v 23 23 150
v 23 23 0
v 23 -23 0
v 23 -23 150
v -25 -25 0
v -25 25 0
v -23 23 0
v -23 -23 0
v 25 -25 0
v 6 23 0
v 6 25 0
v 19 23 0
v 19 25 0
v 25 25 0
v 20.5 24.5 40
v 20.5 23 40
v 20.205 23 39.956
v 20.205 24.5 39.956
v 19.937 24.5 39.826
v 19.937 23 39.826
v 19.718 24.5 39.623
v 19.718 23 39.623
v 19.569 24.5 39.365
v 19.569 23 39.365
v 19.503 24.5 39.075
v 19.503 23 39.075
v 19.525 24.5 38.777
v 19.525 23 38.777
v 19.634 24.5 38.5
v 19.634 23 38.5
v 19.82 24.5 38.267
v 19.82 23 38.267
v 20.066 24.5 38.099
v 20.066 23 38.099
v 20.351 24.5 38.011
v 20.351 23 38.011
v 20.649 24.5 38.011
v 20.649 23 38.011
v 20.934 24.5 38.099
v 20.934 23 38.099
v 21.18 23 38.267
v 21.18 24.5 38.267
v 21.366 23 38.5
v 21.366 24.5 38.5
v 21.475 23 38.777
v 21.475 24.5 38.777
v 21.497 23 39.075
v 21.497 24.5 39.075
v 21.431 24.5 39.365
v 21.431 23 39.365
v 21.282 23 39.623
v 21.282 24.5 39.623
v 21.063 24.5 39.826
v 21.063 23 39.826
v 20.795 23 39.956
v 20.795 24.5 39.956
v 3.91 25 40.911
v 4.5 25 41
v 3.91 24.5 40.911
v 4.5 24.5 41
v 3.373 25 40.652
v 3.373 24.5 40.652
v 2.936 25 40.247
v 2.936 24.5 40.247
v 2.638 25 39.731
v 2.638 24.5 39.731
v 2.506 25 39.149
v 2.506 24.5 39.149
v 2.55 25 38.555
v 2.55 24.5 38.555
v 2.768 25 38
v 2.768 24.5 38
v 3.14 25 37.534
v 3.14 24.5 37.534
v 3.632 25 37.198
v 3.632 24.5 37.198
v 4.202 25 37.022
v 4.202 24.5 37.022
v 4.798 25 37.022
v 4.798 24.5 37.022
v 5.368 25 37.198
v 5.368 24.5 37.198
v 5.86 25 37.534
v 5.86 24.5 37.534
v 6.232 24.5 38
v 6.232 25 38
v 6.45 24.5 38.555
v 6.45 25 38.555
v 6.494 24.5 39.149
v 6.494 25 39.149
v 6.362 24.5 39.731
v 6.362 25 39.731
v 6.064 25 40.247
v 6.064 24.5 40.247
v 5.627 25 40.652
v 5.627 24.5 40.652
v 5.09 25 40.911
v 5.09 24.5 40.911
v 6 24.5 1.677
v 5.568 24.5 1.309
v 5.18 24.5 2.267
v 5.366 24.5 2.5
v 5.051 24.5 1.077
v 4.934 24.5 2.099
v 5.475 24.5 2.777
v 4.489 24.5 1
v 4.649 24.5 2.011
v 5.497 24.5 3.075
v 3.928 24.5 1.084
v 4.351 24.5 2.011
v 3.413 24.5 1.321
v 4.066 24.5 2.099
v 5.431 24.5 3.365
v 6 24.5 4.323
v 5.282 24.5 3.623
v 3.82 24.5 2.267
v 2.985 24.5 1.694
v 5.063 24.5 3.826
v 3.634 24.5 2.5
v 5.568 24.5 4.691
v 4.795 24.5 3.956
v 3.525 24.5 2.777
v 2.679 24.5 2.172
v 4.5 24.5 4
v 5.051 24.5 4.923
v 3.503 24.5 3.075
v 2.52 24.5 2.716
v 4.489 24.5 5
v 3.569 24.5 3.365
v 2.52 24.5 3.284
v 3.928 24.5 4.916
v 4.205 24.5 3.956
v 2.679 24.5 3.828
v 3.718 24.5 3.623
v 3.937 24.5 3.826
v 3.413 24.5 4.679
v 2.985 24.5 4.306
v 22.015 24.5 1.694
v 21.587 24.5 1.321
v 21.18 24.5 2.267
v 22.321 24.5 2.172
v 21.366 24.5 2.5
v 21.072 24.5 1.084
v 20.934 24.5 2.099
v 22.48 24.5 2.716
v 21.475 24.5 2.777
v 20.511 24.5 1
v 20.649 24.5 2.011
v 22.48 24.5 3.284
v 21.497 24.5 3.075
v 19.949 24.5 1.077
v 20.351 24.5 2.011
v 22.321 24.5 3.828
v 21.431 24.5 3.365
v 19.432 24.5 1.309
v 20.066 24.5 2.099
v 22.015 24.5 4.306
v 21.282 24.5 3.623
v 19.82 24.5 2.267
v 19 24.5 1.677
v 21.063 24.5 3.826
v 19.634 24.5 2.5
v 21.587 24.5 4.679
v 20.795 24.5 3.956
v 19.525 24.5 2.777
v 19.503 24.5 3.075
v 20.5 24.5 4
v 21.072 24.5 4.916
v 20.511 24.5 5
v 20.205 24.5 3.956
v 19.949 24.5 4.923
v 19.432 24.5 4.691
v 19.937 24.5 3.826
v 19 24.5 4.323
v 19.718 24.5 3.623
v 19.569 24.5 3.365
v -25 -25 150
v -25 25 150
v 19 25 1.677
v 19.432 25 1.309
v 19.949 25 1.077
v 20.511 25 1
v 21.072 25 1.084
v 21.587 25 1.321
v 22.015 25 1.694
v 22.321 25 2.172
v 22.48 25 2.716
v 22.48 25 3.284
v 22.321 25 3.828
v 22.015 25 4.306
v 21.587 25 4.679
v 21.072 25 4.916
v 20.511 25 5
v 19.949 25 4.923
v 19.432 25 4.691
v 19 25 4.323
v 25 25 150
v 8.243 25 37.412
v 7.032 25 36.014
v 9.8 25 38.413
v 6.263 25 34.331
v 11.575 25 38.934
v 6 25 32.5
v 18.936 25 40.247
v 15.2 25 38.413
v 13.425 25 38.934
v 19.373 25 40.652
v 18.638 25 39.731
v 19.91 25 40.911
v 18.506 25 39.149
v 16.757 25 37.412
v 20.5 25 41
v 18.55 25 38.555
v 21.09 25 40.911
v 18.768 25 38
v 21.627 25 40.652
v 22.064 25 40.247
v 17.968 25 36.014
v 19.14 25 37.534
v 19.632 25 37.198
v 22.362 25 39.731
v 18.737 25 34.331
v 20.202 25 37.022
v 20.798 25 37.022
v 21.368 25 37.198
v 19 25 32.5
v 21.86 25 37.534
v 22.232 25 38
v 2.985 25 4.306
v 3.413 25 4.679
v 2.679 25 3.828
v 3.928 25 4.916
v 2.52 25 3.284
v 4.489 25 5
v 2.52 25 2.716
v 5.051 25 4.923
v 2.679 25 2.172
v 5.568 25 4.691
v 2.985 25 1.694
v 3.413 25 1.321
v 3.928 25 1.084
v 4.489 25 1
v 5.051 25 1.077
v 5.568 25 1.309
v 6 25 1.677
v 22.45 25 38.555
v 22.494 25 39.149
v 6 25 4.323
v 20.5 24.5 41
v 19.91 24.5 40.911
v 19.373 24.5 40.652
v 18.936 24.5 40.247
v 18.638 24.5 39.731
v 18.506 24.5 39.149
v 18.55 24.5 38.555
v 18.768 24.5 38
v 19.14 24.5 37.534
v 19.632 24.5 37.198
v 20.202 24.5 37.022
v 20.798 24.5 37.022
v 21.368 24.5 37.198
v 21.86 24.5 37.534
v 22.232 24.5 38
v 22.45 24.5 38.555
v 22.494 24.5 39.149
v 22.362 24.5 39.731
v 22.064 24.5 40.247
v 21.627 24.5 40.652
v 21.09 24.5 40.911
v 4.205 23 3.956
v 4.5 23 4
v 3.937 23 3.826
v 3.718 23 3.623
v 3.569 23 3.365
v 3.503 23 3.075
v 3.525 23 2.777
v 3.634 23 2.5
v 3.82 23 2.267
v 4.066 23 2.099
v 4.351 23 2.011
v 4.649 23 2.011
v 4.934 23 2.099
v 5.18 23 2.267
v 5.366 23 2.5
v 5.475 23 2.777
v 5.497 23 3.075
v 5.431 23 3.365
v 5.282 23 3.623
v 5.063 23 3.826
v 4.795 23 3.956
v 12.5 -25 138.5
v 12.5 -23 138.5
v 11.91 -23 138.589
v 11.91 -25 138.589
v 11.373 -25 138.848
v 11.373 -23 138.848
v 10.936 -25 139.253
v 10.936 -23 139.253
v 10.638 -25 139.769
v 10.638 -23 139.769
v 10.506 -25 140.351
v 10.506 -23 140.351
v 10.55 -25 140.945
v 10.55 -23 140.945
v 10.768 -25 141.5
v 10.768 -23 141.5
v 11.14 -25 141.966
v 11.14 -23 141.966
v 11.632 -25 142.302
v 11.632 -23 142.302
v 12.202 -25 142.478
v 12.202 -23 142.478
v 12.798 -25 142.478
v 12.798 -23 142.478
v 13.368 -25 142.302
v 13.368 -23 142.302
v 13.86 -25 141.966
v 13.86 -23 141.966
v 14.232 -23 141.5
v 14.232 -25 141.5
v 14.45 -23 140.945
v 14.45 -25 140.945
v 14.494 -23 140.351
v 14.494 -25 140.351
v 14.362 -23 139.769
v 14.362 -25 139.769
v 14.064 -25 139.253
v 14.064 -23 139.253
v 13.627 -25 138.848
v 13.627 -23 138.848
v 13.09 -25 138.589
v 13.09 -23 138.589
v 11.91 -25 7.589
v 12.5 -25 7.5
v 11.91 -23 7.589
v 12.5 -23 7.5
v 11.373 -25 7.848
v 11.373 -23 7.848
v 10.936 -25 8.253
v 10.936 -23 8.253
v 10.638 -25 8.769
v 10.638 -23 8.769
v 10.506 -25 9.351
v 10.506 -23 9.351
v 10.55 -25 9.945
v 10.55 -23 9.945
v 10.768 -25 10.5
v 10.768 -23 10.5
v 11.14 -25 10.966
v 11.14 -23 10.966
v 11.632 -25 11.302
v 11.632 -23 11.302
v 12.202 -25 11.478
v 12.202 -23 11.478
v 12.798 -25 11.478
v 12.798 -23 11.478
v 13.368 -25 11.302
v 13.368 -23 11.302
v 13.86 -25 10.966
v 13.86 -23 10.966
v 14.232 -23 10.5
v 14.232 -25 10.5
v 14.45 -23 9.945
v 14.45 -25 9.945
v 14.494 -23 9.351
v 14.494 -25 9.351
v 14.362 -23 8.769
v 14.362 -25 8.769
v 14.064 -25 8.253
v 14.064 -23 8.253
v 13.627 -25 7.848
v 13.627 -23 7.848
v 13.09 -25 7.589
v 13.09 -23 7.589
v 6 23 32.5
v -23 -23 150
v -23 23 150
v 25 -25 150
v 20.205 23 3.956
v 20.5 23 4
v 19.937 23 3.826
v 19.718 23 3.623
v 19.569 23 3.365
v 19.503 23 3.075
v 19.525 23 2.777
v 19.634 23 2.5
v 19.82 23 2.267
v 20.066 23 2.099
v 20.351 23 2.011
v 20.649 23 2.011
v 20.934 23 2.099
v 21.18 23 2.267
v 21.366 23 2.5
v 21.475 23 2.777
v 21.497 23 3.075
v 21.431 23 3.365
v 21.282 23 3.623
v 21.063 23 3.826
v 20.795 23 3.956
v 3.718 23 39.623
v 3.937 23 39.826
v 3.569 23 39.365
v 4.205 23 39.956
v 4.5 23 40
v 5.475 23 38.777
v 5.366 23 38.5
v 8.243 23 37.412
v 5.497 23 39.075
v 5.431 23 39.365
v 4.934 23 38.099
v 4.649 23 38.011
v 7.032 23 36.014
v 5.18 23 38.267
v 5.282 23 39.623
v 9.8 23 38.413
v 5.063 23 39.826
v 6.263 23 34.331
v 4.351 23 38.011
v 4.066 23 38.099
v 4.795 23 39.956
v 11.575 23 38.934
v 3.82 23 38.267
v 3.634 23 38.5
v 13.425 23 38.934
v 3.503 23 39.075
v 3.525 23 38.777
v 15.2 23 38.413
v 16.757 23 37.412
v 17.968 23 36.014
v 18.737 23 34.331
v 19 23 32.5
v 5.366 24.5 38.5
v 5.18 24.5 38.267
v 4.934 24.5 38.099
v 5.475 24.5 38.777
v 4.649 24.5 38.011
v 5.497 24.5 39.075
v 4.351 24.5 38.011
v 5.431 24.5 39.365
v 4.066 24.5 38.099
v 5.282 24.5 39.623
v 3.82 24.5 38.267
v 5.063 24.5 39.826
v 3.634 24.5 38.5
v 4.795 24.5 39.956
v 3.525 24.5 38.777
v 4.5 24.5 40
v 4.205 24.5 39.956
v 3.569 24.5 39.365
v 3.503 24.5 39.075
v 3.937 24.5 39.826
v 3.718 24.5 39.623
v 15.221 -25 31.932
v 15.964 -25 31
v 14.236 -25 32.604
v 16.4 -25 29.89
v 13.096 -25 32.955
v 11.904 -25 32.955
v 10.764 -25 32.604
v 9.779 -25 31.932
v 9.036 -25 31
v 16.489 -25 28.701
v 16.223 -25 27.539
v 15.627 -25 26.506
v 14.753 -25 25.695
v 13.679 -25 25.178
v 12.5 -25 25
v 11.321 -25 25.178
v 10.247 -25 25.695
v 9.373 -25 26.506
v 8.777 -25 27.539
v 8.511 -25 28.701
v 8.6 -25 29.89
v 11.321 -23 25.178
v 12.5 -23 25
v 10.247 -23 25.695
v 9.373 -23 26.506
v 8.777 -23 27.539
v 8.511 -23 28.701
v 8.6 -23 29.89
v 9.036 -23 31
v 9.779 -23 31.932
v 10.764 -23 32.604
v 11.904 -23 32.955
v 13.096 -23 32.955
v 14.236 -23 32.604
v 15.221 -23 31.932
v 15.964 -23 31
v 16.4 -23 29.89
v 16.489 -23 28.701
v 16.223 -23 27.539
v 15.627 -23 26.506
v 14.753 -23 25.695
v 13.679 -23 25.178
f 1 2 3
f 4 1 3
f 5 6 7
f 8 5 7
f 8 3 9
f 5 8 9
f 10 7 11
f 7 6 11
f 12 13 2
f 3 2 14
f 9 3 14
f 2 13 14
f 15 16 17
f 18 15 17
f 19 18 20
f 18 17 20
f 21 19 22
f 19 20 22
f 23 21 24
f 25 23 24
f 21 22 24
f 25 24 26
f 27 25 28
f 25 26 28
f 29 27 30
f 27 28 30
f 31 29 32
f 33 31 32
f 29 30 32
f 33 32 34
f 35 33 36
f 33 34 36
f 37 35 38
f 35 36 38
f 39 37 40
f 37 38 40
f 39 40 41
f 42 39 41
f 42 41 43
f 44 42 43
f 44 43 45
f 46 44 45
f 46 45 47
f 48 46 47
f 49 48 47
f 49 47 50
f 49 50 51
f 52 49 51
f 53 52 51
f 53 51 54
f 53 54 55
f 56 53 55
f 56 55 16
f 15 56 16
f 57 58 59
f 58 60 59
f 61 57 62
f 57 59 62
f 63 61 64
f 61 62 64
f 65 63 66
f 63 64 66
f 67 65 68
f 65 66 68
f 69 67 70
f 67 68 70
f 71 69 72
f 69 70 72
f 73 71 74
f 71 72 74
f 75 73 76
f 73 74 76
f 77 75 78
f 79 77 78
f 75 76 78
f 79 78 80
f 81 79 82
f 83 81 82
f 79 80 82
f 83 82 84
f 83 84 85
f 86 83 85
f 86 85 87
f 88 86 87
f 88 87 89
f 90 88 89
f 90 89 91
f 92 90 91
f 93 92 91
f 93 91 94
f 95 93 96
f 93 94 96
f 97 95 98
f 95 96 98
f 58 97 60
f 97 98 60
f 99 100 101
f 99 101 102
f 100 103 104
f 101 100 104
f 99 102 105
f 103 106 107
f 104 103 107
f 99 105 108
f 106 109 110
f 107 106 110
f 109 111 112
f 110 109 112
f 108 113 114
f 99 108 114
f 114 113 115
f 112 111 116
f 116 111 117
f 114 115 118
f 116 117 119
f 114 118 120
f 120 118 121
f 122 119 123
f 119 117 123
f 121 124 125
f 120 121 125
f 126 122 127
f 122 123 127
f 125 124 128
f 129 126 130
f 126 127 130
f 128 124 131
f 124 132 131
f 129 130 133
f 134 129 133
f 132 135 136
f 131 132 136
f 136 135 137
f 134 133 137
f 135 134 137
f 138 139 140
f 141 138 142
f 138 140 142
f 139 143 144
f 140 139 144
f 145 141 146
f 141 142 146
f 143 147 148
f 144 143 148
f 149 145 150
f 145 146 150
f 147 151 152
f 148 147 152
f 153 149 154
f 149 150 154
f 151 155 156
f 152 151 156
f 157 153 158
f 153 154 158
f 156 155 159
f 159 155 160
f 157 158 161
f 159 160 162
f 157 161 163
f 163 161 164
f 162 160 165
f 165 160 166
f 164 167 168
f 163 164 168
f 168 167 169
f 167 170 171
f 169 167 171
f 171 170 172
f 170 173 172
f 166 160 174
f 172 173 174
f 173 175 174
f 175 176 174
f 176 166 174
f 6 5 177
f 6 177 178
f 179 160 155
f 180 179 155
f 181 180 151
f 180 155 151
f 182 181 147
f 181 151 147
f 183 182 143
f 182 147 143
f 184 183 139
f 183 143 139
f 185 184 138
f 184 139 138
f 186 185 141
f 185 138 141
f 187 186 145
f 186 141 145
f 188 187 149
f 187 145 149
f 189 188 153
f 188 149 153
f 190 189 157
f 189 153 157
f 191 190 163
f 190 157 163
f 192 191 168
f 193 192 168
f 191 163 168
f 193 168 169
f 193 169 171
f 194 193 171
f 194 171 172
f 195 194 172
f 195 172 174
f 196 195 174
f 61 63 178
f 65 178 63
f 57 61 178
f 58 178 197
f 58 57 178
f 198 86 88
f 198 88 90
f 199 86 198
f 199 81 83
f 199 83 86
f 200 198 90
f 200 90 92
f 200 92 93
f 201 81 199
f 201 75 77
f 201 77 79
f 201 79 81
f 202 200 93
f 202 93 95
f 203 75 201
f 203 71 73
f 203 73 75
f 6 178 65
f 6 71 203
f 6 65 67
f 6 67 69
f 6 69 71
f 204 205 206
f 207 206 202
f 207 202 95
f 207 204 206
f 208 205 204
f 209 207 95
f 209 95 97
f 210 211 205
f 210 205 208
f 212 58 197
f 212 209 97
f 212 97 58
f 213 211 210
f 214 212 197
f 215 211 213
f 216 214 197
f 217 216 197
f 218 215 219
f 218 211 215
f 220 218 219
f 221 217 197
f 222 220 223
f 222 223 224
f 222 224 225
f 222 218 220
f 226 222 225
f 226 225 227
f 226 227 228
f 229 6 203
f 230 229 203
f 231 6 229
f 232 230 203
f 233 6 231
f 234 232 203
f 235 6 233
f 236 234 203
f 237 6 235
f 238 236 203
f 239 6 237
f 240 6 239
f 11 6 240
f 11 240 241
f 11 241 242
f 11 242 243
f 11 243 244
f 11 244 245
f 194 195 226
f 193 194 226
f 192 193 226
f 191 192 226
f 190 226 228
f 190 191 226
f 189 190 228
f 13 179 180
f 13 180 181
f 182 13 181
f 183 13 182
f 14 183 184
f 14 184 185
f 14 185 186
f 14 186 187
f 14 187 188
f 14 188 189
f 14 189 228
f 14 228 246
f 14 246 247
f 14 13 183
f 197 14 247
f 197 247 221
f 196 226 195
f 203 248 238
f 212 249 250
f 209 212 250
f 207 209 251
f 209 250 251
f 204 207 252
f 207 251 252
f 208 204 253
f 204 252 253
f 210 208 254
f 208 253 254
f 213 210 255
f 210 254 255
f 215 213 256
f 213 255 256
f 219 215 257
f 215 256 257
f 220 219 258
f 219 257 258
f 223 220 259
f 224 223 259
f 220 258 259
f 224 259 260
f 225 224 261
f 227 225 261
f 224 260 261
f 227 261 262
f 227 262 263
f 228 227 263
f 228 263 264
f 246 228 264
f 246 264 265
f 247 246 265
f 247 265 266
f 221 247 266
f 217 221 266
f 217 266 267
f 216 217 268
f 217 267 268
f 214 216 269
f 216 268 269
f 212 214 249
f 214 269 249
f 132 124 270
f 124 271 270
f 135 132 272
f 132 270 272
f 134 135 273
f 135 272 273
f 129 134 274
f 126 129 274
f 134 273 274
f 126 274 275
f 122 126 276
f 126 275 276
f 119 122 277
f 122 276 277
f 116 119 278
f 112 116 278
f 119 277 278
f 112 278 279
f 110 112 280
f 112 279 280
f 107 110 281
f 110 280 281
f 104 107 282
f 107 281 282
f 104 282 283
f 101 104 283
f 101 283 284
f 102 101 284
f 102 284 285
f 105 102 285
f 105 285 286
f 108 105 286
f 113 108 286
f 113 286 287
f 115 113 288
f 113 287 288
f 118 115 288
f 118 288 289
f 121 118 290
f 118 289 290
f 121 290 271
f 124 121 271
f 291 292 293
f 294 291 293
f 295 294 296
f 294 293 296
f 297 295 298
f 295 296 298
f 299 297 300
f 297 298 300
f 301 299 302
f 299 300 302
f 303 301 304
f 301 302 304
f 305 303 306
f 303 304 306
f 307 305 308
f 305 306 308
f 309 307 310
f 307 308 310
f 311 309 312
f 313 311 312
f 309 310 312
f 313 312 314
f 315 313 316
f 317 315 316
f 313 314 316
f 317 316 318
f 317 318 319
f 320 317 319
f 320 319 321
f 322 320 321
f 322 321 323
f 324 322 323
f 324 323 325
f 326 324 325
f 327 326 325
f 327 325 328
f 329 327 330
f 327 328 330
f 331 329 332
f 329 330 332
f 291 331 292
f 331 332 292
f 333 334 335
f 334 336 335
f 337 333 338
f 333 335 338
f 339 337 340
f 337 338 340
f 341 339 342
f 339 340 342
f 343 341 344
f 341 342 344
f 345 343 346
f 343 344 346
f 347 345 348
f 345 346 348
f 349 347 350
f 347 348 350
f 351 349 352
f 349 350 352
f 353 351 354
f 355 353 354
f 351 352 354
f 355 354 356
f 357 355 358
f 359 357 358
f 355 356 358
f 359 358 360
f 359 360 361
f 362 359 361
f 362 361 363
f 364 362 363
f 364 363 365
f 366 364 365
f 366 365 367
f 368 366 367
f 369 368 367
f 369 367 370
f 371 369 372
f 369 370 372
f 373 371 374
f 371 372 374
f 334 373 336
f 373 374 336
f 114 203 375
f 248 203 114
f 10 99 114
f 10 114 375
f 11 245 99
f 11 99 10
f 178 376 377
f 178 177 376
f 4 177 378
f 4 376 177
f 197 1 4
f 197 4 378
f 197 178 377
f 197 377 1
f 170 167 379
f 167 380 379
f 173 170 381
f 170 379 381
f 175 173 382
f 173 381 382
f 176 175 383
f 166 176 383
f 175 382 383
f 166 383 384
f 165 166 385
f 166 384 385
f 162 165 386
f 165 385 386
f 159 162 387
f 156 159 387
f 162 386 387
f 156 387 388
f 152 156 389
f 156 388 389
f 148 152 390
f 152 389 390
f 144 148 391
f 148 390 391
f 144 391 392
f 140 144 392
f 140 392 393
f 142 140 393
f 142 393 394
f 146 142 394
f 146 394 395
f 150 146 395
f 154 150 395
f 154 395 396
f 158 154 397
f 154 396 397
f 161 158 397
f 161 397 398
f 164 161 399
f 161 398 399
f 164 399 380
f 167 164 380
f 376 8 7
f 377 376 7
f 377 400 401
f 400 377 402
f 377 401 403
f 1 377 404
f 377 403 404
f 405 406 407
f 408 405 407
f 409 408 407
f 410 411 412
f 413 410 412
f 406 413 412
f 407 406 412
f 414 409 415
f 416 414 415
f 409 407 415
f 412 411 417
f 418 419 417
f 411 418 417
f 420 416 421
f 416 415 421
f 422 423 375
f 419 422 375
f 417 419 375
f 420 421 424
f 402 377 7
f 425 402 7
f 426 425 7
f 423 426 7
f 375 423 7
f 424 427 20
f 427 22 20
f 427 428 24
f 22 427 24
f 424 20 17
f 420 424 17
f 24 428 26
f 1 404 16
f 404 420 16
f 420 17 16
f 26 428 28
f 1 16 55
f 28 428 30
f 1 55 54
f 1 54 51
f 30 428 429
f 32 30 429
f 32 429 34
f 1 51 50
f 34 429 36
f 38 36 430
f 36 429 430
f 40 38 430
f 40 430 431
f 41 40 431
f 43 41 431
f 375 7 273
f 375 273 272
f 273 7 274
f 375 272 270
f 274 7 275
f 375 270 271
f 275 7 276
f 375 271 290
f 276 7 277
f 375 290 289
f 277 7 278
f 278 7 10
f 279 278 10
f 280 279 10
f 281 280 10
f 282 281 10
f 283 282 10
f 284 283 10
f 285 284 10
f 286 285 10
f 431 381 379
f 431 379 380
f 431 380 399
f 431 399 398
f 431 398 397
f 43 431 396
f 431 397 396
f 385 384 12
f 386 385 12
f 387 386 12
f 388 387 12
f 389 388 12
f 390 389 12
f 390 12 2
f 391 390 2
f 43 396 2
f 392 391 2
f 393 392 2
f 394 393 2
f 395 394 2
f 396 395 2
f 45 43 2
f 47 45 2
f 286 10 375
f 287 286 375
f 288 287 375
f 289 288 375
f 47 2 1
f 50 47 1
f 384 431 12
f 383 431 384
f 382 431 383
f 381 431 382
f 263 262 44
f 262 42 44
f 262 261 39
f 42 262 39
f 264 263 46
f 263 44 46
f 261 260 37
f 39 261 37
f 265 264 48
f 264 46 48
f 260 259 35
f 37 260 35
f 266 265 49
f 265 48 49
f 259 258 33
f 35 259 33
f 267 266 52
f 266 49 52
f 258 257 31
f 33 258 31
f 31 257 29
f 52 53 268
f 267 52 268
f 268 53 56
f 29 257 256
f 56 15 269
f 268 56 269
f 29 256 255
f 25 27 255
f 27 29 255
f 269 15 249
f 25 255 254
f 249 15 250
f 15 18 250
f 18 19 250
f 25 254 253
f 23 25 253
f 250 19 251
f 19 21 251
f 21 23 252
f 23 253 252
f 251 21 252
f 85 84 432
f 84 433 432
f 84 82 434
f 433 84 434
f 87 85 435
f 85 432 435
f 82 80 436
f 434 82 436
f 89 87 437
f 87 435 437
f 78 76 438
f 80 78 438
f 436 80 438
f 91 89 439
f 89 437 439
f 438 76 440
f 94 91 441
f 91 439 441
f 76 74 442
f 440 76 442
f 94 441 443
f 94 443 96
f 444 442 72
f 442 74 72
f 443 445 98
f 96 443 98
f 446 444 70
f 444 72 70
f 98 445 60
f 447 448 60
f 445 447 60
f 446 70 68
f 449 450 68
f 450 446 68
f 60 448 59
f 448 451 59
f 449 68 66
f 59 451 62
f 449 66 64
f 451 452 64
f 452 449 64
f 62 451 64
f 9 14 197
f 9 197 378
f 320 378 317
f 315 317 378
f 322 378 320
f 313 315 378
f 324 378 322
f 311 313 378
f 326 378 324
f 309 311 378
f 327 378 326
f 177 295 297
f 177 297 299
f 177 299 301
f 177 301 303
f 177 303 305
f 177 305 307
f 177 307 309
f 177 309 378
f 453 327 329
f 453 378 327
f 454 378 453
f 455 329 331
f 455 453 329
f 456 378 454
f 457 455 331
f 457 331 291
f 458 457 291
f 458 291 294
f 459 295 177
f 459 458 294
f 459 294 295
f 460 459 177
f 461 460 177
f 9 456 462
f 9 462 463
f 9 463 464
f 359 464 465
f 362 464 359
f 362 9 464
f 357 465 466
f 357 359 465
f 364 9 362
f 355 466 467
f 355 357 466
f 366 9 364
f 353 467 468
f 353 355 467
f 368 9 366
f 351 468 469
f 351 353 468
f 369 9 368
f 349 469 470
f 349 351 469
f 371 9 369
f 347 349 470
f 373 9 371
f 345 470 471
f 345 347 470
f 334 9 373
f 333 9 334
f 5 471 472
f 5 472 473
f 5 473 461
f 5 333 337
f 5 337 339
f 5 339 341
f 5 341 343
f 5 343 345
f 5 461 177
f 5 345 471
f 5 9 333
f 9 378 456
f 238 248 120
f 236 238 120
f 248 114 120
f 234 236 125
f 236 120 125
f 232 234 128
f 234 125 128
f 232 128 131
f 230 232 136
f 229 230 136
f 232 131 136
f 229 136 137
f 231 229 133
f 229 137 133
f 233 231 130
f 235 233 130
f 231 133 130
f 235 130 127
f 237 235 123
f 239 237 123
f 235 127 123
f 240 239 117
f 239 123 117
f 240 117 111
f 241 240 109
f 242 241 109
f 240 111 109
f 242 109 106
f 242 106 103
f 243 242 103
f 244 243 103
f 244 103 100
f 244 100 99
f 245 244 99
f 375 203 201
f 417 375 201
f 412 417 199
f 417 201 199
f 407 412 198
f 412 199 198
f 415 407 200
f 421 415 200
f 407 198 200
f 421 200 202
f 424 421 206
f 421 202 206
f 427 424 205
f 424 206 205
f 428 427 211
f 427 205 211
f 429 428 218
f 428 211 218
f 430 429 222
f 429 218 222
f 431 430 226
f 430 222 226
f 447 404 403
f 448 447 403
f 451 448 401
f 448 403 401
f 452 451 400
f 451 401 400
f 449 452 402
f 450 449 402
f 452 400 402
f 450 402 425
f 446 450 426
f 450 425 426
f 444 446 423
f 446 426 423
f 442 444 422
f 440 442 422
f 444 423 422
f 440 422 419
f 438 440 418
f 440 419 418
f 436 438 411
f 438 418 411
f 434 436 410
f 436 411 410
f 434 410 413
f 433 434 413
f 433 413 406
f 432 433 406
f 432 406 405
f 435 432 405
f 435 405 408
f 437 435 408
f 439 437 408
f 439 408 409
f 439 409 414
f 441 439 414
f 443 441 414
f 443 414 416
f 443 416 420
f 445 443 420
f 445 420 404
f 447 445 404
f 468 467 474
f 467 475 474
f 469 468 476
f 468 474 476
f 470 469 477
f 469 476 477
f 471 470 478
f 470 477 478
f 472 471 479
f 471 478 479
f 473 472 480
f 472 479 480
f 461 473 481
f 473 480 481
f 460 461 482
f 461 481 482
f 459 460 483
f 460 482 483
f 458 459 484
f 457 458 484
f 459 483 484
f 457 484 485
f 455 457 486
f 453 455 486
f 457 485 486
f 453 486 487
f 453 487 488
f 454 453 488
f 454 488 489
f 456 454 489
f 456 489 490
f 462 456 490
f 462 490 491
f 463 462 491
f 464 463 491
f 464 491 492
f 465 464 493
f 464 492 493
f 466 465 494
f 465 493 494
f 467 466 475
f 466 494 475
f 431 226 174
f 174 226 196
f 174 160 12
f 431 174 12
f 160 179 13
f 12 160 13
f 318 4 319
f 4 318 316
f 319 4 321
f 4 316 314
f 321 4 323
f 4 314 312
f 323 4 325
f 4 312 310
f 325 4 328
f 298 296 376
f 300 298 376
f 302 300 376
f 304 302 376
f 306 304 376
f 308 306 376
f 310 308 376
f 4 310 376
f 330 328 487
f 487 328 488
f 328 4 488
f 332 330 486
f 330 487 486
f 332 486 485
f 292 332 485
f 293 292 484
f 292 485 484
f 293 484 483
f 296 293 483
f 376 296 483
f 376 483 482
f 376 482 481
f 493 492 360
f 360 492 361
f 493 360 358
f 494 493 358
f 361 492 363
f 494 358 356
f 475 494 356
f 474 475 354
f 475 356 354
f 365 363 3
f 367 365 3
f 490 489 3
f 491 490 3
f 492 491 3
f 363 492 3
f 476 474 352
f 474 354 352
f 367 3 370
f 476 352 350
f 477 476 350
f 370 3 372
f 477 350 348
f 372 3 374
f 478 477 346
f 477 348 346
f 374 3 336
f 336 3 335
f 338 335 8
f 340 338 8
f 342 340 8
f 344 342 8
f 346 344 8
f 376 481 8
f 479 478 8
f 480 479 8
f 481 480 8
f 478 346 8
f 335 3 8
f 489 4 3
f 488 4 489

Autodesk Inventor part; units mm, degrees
ref_plane "YZ Plane" through (0, 0, 0) normal (1, 0, 0) x (0, 1, 0)
ref_plane "XZ Plane" through (0, 0, 0) normal (0, 1, 0) x (-1, 0, 0)
ref_plane "XY Plane" through (0, 0, 0) normal (0, 0, 1) x (1, 0, 0)
sketch "スケッチ1" plane through (0, 0, 0) normal (0, 0, 1) x (1, 0, 0)
  line L0 (-25, 25) -> (25, 25)
  line L1 (25, 25) -> (25, -25)
  line L2 (25, -25) -> (-25, -25)
  line L3 (-25, -25) -> (-25, 25)
  line L4 (-23, 23) -> (23, 23)
  line L5 (23, 23) -> (23, -23)
  line L6 (23, -23) -> (-23, -23)
  line L7 (-23, -23) -> (-23, 23)
  point P0 (0, 0)
  dimension "d0" = 50
  dimension "d1" = 50
  dimension "d2" = 46
  dimension "d3" = 46
  dimension "d4" = 25
  dimension "d5" = 23
  dimension "d142" = 23
  dimension "d143" = 25
extrude "押し出し1" add sketch "スケッチ1" along normal blind 150
sketch "スケッチ2" plane through (-25, 25, 0) normal (0, 1, 0) x (1, 0, 0)
  line L0 (0, 0) -> (50, 0) projected
  line L1 (0, 0) -> (0, -150) projected
  arc A0 (31, -32.5) -> (44, -32.5) centre (37.5, -32.5) ccw
  line L2 (31, -32.5) -> (31, 0)
  line L3 (44, -32.5) -> (44, 0)
  point P0 (25, 0)
  dimension "d10" = 13
  dimension "d11" = 32.5
  dimension "d12" = 37.5
extrude "押し出し2" cut sketch "スケッチ2" against normal blind 2
sketch "スケッチ3" plane through (-25, 25, 150) normal (0, 1, 0) x (1, 0, 0)
  arc A0 (31, 117.5) -> (44, 117.5) centre (37.5, 117.5) ccw projected
  circle A1 centre (29.5, 111) radius 1
  circle A2 centre (29.5, 147) radius 1
  circle A3 centre (45.5, 147) radius 1
  circle A4 centre (45.5, 111) radius 1
  point P0 (25, 150)
  dimension "d15" = 6.5
  dimension "d16" = 6.5
  dimension "d17" = 2
  dimension "d18" = 8
  dimension "d19" = 8
  dimension "d20" = 8
  dimension "d21" = 8
  dimension "d22" = 29.5
  dimension "d23" = 29.5
hole "穴1" at (4.5, 25, 3) at (20.5, 25, 3) at (20.5, 25, 39) at (4.5, 25, 39) direction (0, -1, 0) diameter 2 depth 2 tip angle 118 counterbore diameter 4 counterbore depth 0.5
sketch "スケッチ4" plane through (-25, -25, 0) normal (0, -1, 0) x (1, 0, 0)
  line L0 (50, 0) -> (0, 0) projected
  line L1 (50, 0) -> (50, 150) projected
  circle A0 centre (37.5, 9.5) radius 2
  point P0 (25, 0)
  dimension "d31" = 4
  dimension "d32" = 12.5
  dimension "d33" = 9.5
hole "穴2" at (12.5, -25, 9.5) direction (0, 1, 0) diameter 4 end through all
sketch "スケッチ7" plane through (-25, -25, 0) normal (0, -1, 0) x (1, 0, 0)
  line L0 (50, 0) -> (50, 150) projected
  circle A0 centre (37.5, 29) radius 4
  line L1 (50, 0) -> (0, 0) projected
  point P0 (25, 0)
  dimension "d79" = 8
  dimension "d80" = 12.5
  dimension "d88" = 29
hole "穴5" at (12.5, -25, 29) direction (0, 1, 0) diameter 8 end through all
sketch "スケッチ11" plane through (-25, -25, 0) normal (0, -1, 0) x (1, 0, 0)
  line L0 (50, 150) -> (0, 150) projected
  line L1 (50, 0) -> (50, 150) projected
  circle A0 centre (37.5, 140.5) radius 2
  point P0 (25, 0)
  dimension "d118" = 9.5
  dimension "d119" = 4
  dimension "d120" = 12.5
hole "穴7" at (12.5, -25, 140.5) direction (0, 1, 0) diameter 4 depth 2 tip angle 118
properties part number "07" material "アルミニウム 6061"
